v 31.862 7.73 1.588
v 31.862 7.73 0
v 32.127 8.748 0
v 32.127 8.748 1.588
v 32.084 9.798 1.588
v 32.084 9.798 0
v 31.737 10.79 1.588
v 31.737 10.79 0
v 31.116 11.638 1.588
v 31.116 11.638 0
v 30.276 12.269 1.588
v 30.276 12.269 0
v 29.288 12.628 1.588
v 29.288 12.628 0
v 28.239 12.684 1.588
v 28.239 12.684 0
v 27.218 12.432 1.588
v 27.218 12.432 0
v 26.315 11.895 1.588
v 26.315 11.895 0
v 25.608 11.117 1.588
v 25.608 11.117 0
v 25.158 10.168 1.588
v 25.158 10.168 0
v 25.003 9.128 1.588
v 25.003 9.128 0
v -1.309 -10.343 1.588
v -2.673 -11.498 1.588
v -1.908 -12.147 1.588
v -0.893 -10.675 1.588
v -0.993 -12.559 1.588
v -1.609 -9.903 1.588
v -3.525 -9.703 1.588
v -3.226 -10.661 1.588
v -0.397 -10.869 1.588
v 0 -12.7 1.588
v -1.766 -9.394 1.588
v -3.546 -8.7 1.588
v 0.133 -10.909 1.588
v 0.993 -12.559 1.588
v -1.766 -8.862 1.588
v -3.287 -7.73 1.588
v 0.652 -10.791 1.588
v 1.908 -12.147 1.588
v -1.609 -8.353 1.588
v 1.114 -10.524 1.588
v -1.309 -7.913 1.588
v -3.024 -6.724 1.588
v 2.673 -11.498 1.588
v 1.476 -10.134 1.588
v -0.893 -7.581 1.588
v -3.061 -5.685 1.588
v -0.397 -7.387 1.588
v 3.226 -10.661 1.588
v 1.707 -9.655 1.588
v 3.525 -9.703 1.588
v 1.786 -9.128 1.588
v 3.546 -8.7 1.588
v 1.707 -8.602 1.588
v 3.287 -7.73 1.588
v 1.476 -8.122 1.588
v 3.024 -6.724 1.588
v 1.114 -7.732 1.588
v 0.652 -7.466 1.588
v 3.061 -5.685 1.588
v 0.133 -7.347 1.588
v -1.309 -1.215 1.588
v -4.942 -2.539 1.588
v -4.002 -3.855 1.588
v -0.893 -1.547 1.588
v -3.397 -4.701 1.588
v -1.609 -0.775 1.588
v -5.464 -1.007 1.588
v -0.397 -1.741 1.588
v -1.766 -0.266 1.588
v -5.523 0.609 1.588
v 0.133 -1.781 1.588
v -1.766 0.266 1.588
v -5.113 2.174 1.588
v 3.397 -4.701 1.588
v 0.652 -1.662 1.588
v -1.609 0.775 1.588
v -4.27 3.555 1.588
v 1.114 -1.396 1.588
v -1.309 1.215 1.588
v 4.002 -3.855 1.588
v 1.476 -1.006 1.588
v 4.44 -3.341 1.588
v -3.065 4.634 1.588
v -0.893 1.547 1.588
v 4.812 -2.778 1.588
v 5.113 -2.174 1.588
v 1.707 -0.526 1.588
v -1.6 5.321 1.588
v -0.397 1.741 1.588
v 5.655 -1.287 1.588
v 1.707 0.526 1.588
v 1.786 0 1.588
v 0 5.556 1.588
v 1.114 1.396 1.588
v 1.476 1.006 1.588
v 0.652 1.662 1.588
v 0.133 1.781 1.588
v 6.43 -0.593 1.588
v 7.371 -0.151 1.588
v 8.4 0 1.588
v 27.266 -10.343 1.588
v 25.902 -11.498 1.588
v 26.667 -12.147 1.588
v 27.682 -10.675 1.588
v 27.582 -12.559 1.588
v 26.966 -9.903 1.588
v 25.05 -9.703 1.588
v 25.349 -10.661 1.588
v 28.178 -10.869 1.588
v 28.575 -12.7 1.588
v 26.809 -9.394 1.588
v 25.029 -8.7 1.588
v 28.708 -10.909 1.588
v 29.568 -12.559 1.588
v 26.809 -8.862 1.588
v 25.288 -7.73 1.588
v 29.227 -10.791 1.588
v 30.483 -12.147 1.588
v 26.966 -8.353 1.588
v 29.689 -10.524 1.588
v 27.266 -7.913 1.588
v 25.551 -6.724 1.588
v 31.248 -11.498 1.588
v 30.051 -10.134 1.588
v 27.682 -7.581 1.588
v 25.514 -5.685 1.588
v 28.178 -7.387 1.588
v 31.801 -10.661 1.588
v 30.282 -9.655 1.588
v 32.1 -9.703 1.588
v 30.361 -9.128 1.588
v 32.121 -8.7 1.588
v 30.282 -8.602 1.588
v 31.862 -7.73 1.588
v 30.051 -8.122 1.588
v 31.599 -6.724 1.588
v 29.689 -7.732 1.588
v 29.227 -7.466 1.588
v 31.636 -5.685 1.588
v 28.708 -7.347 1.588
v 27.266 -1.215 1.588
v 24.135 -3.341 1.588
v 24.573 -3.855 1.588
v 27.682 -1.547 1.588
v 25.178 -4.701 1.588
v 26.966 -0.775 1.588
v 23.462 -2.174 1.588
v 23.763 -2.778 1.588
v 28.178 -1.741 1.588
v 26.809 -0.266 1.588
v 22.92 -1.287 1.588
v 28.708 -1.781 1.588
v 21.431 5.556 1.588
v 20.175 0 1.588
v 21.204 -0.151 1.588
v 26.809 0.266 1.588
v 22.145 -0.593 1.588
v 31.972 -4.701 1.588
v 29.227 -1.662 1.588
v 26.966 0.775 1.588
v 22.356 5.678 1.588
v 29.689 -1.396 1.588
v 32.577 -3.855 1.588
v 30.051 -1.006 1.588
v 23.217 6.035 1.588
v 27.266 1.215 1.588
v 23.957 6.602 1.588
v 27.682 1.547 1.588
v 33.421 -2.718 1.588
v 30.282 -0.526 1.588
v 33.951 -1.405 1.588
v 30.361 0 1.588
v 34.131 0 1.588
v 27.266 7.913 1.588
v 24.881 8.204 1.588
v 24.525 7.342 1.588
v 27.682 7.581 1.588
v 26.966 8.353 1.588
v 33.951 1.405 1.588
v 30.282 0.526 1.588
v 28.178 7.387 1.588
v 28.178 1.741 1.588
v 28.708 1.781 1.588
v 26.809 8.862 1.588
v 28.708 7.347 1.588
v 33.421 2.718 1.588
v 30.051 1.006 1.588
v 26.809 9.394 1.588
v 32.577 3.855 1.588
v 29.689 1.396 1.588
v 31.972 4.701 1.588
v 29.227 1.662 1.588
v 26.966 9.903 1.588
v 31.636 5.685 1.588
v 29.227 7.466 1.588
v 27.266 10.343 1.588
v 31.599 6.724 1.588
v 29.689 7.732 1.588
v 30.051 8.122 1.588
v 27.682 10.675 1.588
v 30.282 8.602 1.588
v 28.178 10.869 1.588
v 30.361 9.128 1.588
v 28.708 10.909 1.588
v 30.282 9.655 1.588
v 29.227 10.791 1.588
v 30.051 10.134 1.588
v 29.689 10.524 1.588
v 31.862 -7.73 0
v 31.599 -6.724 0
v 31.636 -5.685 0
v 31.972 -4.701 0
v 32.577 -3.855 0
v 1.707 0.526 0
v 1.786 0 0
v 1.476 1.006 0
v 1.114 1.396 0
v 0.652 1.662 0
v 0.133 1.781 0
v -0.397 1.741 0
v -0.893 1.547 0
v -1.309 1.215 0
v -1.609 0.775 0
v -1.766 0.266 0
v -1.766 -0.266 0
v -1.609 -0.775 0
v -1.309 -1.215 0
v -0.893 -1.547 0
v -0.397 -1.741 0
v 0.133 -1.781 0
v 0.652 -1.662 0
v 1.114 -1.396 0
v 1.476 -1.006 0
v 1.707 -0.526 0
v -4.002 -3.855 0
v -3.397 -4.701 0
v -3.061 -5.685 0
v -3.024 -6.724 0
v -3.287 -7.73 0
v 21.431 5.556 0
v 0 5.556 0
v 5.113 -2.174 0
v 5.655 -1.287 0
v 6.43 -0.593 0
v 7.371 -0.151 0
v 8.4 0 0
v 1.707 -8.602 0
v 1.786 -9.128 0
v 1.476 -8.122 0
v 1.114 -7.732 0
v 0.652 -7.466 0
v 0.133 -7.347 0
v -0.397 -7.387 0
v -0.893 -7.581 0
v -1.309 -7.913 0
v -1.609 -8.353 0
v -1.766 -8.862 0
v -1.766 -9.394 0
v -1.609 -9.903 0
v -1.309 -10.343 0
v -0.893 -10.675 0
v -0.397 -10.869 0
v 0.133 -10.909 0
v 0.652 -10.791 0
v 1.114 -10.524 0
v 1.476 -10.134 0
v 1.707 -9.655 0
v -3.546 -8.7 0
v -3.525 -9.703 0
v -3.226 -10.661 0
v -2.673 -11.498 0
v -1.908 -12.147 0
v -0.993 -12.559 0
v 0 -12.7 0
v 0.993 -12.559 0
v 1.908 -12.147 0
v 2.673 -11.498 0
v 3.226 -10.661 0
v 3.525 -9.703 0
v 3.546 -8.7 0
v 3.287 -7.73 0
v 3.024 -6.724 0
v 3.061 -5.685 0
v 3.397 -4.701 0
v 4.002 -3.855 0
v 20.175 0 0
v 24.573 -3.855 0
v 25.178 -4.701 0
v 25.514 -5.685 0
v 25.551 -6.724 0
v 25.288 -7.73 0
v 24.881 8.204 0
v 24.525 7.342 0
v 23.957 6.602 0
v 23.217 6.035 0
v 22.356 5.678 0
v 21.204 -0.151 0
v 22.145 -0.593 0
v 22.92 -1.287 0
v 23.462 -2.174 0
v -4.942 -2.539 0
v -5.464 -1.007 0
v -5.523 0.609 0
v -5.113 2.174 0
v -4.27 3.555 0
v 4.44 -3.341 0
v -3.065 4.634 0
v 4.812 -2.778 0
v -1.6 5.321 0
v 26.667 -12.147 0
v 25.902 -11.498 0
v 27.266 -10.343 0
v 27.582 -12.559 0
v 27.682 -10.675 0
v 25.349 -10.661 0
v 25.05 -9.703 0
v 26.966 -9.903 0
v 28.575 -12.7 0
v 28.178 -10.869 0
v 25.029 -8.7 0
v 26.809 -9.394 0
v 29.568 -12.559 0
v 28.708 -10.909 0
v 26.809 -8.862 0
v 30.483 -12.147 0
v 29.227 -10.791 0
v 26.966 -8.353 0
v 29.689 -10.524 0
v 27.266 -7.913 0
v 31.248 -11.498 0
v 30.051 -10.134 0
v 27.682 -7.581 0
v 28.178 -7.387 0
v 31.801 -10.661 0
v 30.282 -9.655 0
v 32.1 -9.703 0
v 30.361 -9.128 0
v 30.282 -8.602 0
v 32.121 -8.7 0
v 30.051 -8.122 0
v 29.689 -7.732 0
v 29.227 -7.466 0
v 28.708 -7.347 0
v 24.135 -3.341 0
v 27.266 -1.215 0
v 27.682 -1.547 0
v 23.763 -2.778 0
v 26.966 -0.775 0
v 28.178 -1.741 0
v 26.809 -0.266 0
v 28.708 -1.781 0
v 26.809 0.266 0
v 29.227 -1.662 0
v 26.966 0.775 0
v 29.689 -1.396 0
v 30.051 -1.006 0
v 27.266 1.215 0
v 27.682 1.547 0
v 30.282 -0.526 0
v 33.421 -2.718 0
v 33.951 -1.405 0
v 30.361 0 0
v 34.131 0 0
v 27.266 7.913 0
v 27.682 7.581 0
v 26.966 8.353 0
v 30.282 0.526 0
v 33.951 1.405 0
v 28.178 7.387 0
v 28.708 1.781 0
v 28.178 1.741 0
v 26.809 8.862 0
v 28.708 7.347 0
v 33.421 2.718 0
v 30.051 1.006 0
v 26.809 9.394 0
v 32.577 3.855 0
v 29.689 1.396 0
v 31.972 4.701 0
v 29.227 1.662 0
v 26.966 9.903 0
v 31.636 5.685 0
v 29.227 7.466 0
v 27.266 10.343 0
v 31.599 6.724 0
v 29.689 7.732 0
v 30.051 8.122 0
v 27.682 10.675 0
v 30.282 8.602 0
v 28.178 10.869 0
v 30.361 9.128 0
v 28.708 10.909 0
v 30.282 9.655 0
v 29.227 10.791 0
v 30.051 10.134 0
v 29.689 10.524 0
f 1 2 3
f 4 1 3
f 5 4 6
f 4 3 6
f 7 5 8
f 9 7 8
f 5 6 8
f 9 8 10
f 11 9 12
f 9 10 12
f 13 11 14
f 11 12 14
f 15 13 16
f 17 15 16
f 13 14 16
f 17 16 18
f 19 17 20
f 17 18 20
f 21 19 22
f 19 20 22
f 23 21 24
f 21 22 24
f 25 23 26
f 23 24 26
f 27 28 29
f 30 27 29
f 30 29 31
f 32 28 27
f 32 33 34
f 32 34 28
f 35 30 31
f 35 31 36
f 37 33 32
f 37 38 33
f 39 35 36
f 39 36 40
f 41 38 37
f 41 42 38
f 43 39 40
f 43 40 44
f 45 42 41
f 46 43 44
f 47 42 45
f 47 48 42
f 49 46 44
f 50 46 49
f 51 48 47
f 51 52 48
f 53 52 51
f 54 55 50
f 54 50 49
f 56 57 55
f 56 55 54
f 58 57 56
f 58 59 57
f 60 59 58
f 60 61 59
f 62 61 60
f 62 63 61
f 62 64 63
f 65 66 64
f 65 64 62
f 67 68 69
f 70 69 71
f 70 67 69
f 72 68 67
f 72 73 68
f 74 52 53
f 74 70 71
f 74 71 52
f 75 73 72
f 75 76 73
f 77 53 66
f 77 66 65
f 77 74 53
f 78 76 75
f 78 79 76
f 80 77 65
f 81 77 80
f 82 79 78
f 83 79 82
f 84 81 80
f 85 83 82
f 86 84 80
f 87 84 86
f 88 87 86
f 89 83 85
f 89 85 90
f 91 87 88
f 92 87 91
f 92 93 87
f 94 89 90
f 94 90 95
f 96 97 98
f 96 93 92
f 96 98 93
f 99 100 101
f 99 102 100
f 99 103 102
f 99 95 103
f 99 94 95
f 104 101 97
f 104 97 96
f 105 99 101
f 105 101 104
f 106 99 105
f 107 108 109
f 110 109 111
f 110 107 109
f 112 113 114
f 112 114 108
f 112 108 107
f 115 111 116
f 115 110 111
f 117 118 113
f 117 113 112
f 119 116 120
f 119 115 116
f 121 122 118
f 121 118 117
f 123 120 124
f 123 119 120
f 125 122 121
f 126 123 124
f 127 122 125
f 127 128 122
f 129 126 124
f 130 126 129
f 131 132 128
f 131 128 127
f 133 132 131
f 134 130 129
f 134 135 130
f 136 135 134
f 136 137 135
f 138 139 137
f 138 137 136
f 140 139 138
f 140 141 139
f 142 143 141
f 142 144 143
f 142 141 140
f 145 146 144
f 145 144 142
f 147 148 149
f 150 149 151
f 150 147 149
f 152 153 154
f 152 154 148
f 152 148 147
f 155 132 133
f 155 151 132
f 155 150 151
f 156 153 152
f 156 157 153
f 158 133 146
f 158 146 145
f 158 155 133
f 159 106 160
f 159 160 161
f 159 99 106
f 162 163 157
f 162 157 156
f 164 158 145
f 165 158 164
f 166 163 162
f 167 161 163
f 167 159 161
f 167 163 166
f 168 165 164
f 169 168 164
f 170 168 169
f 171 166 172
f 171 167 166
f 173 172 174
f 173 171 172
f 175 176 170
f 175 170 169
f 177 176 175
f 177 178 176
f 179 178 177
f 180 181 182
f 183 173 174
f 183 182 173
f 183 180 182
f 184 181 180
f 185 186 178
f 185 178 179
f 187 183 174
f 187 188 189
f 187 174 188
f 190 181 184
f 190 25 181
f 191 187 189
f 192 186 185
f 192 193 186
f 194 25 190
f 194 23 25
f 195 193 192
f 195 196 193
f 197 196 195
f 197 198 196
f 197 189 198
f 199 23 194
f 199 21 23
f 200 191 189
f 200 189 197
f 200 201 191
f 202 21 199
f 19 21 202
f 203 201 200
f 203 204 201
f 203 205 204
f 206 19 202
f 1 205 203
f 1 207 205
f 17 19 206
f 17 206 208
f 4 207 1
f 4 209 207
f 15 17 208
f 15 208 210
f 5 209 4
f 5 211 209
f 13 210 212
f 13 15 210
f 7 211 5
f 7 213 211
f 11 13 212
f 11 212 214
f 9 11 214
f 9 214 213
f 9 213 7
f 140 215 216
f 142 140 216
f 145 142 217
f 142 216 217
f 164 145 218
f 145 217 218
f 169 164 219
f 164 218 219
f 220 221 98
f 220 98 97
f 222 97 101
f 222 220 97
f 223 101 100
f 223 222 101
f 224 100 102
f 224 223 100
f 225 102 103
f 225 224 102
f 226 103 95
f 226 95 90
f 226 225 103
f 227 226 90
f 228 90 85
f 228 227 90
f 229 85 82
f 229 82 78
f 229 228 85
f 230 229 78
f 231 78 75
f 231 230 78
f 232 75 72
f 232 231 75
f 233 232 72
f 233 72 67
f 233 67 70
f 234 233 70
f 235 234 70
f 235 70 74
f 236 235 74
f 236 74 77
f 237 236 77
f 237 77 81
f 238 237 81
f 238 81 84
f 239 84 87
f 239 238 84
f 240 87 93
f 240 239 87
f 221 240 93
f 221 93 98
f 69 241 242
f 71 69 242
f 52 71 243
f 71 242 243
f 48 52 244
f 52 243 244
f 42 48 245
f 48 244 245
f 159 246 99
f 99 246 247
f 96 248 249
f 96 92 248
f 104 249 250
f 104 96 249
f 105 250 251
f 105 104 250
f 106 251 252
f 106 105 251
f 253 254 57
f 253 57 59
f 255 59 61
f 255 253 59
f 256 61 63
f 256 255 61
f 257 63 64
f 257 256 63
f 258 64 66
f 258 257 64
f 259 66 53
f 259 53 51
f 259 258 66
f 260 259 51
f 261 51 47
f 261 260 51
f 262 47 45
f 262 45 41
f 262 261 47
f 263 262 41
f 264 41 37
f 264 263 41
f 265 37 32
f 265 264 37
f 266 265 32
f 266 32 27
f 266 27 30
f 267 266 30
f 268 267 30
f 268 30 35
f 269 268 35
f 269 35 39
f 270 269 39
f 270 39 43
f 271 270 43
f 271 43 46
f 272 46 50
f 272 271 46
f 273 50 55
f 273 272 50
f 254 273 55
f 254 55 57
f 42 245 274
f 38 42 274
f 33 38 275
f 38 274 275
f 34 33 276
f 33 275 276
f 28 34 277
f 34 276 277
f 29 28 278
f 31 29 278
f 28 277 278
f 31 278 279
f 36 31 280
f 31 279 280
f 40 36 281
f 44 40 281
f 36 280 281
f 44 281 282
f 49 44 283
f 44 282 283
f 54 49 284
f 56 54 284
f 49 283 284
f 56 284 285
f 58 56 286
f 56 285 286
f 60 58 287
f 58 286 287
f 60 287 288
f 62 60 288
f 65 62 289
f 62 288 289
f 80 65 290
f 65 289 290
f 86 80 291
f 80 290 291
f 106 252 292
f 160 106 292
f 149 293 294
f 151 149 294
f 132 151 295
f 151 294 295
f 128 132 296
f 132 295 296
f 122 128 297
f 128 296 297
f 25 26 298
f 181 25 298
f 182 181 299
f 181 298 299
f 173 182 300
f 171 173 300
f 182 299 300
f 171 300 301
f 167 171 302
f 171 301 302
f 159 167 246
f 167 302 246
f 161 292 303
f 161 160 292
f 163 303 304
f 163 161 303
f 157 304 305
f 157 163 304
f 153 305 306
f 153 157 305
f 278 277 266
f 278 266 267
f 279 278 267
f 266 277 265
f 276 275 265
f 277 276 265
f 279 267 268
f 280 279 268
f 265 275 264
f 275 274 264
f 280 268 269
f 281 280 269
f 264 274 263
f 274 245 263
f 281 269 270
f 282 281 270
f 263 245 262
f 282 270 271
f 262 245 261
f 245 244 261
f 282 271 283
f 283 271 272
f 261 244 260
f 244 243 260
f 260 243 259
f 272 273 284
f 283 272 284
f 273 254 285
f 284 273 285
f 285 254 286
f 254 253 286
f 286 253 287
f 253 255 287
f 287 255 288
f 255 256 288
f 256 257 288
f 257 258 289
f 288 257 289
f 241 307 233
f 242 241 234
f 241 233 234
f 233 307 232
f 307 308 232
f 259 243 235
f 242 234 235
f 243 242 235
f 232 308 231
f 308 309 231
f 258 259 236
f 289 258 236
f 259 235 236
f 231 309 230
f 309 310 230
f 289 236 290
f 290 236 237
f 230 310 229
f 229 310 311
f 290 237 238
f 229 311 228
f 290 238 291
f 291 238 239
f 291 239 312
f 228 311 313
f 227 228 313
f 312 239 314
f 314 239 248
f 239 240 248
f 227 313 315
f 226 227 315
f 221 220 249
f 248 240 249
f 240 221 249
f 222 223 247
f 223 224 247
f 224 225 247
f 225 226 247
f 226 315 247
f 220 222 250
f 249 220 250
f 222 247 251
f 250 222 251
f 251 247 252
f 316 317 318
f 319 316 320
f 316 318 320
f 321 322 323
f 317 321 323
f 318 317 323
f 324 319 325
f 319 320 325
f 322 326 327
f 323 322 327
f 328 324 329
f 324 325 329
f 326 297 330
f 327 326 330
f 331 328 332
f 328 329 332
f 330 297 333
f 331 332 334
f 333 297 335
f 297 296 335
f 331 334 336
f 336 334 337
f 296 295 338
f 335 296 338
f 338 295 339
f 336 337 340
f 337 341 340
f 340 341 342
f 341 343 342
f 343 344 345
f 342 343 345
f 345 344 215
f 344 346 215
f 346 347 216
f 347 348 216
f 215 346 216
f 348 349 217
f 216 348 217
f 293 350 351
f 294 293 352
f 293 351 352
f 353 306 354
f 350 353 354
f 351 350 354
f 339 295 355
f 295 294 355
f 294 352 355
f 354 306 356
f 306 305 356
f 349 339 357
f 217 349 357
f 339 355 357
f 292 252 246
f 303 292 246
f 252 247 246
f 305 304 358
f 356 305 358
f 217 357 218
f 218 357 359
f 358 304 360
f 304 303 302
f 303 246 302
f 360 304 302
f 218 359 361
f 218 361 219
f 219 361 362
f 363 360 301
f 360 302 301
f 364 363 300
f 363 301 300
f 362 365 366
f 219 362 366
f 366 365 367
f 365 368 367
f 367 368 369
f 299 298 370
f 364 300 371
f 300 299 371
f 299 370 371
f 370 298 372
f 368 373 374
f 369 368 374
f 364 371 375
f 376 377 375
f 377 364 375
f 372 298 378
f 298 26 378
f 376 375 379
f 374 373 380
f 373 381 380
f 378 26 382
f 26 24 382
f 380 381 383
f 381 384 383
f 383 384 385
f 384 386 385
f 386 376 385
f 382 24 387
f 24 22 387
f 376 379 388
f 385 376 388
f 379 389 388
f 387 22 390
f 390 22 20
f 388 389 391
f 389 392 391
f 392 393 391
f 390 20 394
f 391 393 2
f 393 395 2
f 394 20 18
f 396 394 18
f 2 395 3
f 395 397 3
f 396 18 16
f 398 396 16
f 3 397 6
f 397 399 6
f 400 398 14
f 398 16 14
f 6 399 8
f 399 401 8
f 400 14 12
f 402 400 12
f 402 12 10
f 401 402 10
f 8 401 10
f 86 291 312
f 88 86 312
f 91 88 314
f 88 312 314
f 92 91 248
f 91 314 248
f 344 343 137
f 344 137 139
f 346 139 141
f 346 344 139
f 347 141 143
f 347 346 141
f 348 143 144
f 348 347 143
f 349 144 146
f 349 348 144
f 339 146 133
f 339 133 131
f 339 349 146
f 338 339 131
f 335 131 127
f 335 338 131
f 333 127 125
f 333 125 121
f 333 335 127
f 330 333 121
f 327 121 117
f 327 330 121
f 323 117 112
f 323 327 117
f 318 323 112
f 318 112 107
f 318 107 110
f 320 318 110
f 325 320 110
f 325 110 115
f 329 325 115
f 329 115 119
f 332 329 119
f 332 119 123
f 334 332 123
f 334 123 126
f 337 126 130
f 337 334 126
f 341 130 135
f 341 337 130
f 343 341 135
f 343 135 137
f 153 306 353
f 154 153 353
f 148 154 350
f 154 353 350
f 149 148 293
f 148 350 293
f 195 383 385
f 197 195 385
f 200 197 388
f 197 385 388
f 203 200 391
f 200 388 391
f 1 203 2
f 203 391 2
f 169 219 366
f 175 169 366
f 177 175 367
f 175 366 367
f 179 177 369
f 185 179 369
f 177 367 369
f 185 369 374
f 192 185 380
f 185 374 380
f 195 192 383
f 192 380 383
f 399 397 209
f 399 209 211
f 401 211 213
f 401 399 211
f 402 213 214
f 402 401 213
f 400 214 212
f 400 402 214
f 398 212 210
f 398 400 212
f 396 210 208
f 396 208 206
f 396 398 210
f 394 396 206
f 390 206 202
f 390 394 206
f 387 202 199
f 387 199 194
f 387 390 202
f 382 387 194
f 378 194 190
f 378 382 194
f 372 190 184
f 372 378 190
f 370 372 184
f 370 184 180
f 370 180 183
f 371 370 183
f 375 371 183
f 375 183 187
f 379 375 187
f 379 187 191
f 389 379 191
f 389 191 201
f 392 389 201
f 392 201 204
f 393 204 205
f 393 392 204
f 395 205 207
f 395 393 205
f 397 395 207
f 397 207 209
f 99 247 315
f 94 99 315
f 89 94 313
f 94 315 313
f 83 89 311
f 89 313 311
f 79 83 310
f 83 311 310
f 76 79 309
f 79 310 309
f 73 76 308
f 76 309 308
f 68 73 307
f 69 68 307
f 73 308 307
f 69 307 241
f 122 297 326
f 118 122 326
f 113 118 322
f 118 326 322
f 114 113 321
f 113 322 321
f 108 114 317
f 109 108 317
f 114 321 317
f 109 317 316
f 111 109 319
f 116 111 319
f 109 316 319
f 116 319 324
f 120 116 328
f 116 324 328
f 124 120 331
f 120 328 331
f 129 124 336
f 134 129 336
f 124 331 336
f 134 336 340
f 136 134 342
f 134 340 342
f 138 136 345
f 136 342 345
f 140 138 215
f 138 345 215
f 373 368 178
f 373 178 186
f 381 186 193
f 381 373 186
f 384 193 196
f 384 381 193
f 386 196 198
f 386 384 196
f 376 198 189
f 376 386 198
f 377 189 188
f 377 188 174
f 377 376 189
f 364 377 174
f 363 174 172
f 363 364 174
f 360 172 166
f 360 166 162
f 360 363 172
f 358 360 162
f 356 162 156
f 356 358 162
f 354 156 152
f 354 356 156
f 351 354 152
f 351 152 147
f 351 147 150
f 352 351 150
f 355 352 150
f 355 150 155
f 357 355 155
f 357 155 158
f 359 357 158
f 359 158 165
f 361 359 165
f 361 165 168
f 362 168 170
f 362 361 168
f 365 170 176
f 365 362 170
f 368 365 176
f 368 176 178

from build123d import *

# Parameters (mm, degrees)
SKETCH1_R           = 1.7859375
BOSS_EXTRUDE1_DEPTH = 1.5875
FILLET1_R           = 3.571875


with BuildPart() as part:
    # Sketch1 → Boss-Extrude1 (new body)
    with BuildSketch(Plane.XY):
        with BuildLine():
            ThreePointArc((4.001636181, -3.854714248), (5.152960561, -2.078199104), (5.55625, 0))
            Line((5.55625, 0), (23.01875, 0))
            ThreePointArc((23.01875, 0), (23.422039397, -2.078199001), (24.573363664, -3.854714088))
            ThreePointArc((24.573363664, -3.854714088), (25.513553345, -5.68510334), (25.287941571, -7.730434799))
            ThreePointArc((25.287941571, -7.730434799), (28.575000018, -12.7), (31.862058415, -7.730434766))
            ThreePointArc((31.862058415, -7.730434766), (31.636446643, -5.685103406), (32.576636217, -3.854714211))
            ThreePointArc((32.576636217, -3.854714211), (34.13125, -2e-08), (32.576636245, 3.854714182))
            ThreePointArc((32.576636245, 3.854714182), (31.636446652, 5.685103357), (31.862058392, 7.730434711))
            ThreePointArc((31.862058392, 7.730434711), (29.288207306, 12.628071622), (25.003125, 9.128125))
            ThreePointArc((25.003125, 9.128125), (23.956947034, 6.602427966), (21.43125, 5.55625))
            Line((21.43125, 5.55625), (0, 5.55625))
            ThreePointArc((0, 5.55625), (-5.113202033, 2.174184683), (-4.00163619, -3.85471424))
            ThreePointArc((-4.00163619, -3.85471424), (-3.061446646, -5.685103393), (-3.287058389, -7.730434703))
            ThreePointArc((-3.287058389, -7.730434703), (1.4e-08, -12.7), (3.287058378, -7.730434678))
            ThreePointArc((3.287058378, -7.730434678), (3.061446647, -5.685103385), (4.001636181, -3.854714248))
        make_face()
        Circle(SKETCH1_R, mode=Mode.SUBTRACT)
        with Locations((28.575, 0)):
            Circle(SKETCH1_R, mode=Mode.SUBTRACT)
        with Locations((0, -9.128125)):
            Circle(SKETCH1_R, mode=Mode.SUBTRACT)
        with Locations((28.575, -9.128125)):
            Circle(SKETCH1_R, mode=Mode.SUBTRACT)
        with Locations((28.575, 9.128125)):
            Circle(SKETCH1_R, mode=Mode.SUBTRACT)
    extrude(amount=BOSS_EXTRUDE1_DEPTH)

    # Fillet1
    fillet1_edges = [part.edges().sort_by_distance(p)[0] for p in [
        (23.01875, 0, 0.79375),
        (5.55625, 0, 0.79375),
    ]]
    fillet(fillet1_edges, radius=FILLET1_R)


solid = part.part
